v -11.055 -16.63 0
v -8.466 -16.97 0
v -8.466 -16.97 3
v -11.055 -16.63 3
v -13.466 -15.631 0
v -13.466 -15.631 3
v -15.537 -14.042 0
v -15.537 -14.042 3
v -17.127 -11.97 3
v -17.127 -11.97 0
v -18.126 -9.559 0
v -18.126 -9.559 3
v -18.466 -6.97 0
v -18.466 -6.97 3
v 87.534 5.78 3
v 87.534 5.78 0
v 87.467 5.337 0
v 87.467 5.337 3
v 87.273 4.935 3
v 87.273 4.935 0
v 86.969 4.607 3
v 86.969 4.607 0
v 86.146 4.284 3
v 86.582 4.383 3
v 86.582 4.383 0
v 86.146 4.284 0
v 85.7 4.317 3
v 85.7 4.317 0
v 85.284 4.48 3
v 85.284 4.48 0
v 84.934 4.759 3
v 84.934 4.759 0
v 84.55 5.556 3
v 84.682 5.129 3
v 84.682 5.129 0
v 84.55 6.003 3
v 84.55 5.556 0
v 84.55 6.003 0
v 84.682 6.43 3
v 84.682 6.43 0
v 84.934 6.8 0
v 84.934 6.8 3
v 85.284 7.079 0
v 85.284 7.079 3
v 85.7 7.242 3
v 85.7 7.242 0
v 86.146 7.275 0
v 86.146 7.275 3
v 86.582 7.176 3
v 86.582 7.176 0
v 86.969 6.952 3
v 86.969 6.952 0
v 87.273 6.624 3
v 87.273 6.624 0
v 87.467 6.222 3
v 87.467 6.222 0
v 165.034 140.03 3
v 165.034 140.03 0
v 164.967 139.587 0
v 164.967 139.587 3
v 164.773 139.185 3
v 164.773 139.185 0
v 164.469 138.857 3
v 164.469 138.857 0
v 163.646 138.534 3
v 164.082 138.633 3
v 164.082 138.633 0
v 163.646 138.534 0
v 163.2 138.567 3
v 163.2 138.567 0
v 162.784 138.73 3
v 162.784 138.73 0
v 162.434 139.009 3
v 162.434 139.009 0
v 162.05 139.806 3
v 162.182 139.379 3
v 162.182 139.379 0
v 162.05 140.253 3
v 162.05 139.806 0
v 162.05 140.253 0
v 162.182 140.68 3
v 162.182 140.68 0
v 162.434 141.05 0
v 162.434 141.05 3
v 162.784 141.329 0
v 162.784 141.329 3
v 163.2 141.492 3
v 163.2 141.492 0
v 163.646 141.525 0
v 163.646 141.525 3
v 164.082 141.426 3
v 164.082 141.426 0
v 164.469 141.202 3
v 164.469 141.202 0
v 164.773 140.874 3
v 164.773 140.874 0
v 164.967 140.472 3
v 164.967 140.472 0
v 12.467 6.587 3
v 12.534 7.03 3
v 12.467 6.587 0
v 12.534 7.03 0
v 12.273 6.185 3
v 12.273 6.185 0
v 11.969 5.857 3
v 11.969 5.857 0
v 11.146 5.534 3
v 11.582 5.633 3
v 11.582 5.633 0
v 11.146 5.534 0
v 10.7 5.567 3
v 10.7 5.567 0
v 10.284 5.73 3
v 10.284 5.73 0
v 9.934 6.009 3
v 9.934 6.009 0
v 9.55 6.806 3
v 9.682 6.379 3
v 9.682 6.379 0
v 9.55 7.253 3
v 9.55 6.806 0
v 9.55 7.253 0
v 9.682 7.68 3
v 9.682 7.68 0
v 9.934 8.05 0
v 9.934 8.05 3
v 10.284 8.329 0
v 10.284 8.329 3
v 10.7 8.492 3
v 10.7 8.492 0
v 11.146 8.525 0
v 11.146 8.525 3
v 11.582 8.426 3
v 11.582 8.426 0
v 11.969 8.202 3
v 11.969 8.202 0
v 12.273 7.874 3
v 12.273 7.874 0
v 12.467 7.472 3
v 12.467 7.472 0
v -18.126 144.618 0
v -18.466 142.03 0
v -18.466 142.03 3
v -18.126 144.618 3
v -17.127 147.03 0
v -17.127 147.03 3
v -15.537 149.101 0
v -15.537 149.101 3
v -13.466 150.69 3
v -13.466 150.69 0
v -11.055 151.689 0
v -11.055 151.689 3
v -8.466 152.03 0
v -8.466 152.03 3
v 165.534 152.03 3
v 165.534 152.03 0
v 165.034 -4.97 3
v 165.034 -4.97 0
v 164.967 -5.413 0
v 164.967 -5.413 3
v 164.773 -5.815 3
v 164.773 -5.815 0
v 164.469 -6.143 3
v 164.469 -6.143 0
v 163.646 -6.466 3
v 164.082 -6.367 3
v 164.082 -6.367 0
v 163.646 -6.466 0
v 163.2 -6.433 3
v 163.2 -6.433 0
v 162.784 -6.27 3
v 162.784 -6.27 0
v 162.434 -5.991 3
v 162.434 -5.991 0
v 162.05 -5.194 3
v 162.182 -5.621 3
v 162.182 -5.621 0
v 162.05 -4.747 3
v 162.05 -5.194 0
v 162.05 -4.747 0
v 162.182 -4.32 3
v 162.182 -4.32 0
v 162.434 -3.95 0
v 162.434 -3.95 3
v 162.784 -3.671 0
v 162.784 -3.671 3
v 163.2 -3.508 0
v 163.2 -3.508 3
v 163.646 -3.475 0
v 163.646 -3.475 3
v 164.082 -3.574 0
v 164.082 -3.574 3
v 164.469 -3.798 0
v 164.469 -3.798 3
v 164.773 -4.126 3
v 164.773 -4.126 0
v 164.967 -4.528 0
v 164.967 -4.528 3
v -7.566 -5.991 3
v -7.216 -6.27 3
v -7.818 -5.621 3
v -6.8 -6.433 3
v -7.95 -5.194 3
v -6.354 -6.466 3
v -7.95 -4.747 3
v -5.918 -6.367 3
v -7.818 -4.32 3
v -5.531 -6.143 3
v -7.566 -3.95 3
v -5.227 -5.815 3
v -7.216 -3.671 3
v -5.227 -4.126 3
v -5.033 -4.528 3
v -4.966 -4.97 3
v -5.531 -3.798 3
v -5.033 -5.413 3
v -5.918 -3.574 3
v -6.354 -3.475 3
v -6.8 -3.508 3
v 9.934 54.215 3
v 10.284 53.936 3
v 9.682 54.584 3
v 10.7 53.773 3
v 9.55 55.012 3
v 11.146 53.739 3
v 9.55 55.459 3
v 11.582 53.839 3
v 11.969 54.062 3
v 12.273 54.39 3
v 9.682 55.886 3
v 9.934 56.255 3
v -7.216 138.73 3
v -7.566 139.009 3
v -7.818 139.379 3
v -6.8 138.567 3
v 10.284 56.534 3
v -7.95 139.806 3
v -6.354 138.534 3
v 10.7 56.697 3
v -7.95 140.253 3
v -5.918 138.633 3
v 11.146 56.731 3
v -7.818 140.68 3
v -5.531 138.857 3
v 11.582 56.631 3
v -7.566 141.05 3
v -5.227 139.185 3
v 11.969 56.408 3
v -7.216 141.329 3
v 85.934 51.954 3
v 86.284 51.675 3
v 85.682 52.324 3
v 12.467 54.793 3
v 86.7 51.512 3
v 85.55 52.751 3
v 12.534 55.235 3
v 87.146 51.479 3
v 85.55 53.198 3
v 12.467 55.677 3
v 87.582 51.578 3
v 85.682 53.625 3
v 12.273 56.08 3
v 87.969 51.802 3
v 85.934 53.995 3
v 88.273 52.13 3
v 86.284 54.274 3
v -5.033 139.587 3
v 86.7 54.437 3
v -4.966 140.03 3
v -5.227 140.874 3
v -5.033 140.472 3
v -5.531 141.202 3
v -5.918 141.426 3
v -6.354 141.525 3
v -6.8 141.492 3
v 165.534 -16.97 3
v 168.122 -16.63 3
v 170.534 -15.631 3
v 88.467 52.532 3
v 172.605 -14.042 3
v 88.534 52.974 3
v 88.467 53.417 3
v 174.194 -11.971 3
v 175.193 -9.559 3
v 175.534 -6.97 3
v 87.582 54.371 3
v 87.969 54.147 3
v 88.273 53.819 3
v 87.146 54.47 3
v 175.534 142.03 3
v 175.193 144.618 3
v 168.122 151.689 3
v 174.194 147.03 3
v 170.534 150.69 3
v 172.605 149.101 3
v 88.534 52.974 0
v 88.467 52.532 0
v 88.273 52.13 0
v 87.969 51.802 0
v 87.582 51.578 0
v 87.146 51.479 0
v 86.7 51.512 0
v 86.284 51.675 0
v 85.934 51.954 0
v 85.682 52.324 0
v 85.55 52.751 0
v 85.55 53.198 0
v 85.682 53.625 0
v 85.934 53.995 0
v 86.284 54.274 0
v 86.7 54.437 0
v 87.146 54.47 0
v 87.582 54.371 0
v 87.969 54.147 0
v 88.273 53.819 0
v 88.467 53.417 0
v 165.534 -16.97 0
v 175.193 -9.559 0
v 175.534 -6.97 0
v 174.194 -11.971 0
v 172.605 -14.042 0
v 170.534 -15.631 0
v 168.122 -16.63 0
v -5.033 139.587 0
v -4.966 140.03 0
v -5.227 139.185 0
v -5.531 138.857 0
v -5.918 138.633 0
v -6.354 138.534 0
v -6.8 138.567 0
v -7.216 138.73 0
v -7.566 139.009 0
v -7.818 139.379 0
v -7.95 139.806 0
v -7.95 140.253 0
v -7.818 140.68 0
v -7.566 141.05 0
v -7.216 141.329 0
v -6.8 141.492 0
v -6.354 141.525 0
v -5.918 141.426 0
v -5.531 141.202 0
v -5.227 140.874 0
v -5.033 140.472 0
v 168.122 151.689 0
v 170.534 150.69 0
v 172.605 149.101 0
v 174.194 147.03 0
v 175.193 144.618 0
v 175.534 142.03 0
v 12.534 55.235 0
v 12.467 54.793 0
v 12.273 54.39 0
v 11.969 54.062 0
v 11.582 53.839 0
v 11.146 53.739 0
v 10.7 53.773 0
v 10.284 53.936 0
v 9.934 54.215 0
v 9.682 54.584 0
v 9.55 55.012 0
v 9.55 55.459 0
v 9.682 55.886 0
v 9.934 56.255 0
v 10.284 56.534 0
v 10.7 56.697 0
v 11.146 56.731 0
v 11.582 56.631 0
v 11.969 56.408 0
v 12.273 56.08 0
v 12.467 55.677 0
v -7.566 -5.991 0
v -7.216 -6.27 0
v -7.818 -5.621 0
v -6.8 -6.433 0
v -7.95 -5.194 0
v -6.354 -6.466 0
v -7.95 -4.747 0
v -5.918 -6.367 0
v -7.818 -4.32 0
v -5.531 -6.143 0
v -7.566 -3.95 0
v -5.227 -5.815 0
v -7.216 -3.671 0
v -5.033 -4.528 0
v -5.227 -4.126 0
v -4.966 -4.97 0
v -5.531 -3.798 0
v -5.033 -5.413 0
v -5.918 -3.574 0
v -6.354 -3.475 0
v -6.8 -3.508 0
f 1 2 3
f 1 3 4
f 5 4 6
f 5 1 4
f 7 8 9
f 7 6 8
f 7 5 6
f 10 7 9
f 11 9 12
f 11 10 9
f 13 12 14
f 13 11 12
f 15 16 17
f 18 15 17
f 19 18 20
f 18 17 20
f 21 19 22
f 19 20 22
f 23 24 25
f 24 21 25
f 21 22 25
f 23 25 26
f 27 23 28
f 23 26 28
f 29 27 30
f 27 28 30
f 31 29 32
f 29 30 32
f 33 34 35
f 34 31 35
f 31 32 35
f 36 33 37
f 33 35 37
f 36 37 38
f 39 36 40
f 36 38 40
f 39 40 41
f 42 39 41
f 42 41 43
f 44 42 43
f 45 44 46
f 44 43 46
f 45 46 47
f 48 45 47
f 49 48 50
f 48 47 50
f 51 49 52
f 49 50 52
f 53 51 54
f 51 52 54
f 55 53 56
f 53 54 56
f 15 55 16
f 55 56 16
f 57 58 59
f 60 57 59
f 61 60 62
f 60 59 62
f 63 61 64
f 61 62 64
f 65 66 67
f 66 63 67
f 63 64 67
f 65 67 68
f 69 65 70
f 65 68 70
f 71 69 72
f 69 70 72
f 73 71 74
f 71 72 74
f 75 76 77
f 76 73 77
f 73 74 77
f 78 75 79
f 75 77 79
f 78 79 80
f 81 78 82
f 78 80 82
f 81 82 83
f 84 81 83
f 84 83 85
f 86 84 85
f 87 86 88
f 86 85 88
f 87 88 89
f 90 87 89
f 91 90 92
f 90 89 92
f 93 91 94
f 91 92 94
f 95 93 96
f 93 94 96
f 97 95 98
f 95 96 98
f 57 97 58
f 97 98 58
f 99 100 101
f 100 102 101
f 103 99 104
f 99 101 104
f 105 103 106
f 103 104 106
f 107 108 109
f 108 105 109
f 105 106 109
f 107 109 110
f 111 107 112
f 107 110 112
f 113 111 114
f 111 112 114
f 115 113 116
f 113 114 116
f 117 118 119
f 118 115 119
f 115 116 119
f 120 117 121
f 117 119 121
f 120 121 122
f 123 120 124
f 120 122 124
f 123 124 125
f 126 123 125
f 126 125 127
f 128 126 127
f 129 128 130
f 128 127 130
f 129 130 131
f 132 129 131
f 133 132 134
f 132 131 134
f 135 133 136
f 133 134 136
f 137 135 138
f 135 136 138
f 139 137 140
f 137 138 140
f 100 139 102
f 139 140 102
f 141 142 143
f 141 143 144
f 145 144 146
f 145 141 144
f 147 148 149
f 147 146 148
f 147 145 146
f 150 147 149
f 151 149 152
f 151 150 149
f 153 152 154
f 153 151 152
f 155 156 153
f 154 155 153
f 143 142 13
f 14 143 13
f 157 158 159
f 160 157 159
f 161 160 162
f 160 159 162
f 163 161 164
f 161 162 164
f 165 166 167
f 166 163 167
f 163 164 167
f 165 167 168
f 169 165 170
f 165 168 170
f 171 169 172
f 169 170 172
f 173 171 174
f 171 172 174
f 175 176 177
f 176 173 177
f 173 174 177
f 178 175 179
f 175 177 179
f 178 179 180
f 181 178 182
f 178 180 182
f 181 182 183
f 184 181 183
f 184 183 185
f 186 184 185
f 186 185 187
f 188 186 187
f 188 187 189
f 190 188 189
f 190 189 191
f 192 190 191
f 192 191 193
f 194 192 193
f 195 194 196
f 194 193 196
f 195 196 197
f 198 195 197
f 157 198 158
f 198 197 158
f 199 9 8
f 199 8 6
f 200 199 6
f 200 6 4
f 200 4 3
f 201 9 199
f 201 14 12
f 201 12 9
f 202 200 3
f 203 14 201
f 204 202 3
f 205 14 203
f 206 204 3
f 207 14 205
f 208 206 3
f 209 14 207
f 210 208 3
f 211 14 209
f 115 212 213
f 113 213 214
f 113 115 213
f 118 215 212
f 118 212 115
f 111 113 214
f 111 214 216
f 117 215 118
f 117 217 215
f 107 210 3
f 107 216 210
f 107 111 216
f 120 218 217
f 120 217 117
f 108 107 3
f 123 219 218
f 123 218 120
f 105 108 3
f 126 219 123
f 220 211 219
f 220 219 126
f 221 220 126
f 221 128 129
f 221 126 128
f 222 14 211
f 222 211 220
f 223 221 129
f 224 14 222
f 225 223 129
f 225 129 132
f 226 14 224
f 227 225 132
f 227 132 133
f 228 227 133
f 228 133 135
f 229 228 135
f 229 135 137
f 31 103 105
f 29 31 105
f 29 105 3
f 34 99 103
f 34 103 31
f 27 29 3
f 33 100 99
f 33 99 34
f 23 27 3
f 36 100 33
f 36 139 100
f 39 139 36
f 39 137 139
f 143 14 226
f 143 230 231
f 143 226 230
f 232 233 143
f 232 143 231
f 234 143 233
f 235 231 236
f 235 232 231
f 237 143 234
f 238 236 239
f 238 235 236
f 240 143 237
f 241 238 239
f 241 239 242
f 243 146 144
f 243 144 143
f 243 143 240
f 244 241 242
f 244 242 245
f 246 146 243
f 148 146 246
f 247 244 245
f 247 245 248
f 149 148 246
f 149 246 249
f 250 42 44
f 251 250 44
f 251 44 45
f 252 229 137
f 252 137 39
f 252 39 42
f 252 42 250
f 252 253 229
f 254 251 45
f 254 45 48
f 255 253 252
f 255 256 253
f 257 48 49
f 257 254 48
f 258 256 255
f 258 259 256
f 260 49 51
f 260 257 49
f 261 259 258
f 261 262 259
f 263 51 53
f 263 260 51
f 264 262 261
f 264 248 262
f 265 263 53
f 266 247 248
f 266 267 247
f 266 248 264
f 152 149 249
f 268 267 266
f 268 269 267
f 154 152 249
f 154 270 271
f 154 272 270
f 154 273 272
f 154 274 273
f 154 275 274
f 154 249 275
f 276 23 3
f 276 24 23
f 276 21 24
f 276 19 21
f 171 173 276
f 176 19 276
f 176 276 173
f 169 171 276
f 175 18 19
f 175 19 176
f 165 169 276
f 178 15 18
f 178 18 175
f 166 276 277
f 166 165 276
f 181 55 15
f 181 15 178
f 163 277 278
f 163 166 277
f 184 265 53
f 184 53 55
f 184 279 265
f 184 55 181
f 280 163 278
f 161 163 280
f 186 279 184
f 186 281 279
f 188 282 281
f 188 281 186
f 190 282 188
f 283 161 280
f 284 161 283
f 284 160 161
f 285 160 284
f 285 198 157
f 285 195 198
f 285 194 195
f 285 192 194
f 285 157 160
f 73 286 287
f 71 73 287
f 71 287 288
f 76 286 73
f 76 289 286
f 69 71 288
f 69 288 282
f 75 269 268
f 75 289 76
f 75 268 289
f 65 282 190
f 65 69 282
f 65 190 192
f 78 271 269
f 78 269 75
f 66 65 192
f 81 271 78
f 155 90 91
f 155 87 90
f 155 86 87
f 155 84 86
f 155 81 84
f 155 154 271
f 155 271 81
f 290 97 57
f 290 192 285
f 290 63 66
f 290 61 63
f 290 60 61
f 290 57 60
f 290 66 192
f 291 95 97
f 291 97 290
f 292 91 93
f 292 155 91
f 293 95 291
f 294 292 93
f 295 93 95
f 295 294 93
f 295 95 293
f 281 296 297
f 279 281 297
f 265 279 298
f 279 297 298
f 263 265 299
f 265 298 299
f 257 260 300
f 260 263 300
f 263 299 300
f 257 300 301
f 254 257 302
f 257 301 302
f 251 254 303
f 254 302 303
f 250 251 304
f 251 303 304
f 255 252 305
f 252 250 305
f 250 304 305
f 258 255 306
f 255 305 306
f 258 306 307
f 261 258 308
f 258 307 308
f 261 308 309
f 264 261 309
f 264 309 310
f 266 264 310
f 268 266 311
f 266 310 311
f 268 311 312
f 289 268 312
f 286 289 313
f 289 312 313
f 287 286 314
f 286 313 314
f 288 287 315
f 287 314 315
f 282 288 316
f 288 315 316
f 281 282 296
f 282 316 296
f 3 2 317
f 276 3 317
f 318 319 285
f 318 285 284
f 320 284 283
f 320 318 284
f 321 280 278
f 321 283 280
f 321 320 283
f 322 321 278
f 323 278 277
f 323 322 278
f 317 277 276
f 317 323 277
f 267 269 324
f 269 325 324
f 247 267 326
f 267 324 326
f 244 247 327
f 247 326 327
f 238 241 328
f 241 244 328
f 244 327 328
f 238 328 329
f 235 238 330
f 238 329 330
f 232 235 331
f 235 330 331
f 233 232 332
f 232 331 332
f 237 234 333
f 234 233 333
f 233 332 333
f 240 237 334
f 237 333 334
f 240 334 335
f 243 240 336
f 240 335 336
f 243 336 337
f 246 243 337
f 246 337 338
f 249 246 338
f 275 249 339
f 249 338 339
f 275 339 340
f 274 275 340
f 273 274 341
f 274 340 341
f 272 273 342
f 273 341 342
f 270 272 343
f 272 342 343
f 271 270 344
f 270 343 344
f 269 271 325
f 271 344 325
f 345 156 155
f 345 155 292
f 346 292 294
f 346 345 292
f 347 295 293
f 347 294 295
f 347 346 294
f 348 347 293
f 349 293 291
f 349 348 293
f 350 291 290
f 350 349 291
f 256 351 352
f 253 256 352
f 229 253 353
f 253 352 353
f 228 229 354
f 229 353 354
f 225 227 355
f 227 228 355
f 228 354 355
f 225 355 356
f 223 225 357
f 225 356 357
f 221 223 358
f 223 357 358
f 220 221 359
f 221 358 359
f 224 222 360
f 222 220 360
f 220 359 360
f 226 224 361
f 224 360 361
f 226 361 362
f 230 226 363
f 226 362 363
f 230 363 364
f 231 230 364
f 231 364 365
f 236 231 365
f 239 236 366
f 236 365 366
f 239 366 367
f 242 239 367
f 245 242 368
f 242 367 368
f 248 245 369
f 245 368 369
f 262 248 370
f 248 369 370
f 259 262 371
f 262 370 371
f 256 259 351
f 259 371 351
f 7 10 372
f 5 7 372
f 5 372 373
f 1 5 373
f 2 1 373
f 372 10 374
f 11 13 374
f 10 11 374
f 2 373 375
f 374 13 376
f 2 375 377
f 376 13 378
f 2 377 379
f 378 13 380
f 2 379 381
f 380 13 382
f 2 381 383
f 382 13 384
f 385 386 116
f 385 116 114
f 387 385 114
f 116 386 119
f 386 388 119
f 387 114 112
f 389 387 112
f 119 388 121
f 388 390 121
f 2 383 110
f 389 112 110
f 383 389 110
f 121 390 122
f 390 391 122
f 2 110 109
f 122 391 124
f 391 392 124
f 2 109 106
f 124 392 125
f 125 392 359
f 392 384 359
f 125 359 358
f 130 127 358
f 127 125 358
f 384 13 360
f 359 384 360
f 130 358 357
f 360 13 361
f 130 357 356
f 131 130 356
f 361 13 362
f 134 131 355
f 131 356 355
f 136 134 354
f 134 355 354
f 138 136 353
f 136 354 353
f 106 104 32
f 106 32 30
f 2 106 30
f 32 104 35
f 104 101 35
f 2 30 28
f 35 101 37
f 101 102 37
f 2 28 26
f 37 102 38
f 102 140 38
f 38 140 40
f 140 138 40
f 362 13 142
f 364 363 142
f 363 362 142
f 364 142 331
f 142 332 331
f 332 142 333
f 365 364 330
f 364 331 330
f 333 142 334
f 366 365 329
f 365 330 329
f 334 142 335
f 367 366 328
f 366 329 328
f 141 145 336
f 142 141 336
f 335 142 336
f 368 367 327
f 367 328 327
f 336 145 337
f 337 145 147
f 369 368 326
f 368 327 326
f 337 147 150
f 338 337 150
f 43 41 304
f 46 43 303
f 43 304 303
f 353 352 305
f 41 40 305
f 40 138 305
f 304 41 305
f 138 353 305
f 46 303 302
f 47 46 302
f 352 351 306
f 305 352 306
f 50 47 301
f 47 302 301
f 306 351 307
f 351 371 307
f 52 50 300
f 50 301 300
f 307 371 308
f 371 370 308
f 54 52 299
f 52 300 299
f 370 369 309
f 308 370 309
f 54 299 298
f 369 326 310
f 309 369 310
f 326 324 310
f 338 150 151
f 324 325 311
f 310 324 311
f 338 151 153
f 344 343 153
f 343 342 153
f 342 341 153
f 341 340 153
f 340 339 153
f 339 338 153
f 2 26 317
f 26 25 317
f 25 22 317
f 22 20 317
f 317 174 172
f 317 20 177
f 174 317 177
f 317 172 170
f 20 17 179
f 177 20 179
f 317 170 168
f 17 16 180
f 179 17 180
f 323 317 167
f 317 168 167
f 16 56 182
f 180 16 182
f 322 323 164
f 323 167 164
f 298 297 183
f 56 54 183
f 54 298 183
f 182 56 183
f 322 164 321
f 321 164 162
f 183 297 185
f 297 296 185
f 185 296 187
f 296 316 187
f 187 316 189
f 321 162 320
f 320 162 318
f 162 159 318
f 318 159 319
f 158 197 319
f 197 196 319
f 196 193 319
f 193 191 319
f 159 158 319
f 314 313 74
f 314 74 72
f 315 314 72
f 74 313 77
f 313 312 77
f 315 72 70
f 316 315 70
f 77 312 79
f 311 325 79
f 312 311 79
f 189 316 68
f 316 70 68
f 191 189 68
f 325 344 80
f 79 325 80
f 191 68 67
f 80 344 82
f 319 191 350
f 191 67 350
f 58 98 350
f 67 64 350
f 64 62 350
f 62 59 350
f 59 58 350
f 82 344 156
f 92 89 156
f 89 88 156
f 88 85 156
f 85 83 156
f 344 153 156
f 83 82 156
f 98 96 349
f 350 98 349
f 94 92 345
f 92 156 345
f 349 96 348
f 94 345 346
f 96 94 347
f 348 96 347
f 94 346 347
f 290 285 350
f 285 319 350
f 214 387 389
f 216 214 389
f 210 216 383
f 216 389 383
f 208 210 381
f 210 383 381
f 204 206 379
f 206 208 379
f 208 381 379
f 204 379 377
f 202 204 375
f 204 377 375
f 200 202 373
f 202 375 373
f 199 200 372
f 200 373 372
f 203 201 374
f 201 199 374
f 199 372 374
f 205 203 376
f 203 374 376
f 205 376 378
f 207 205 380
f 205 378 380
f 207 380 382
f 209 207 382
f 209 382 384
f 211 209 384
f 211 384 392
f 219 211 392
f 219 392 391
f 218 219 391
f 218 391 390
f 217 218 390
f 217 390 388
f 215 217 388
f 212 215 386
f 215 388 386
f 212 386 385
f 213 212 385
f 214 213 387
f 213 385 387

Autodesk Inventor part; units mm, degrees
ref_plane "YZ Plane" through (0, 0, 0) normal (1, 0, 0) x (0, 1, 0)
ref_plane "XZ Plane" through (0, 0, 0) normal (0, 1, 0) x (-1, 0, 0)
ref_plane "XY Plane" through (0, 0, 0) normal (0, 0, 1) x (1, 0, 0)
sketch "Sketch1" plane through (0, 0, 0) normal (0, 0, 1) x (1, 0, 0)
  line L0 (-6.4664, 150.0295) -> (163.5336, 150.0295) construction
  line L1 (173.5336, 140.0295) -> (173.5336, -4.9705) construction
  line L2 (163.5336, -14.9705) -> (-6.4664, -14.9705)
  line L3 (-16.4664, -4.9705) -> (-16.4664, 140.0295)
  arc A0 (-6.4664, 150.0295) -> (-16.4664, 140.0295) centre (-6.4664, 140.0295) ccw
  arc A1 (173.5336, 140.0295) -> (163.5336, 150.0295) centre (163.5336, 140.0295) ccw construction
  arc A2 (163.5336, -14.9705) -> (173.5336, -4.9705) centre (163.5336, -4.9705) ccw
  arc A3 (-16.4664, -4.9705) -> (-6.4664, -14.9705) centre (-6.4664, -4.9705) ccw
  line L4 (-16.4664, 140.0295) -> (173.5336, 140.0295) construction
  line L5 (-16.4664, -4.9705) -> (173.5336, -4.9705) construction
  line L6 (-6.4664, -14.9705) -> (-6.4664, 150.0295) construction
  line L7 (163.5336, 150.0295) -> (163.5336, -14.9705) construction
  circle A4 centre (-6.4664, 140.0295) radius 1.5
  circle A5 centre (163.5336, 140.0295) radius 1.5
  circle A6 centre (163.5336, -4.9705) radius 1.5
  circle A7 centre (-6.4664, -4.9705) radius 1.5
  circle A8 centre (11.0336, 7.0295) radius 1.5
  circle A9 centre (86.0336, 5.7795) radius 1.5
  circle A10 centre (11.0336, 55.2351) radius 1.5
  circle A11 centre (87.0336, 52.9745) radius 1.5
  line L8 (-8.4664, -16.9705) -> (165.5336, -16.9705)
  line L9 (175.5336, -6.9705) -> (175.5336, 142.0295)
  line L10 (165.5336, 152.0295) -> (-8.4664, 152.0295)
  line L11 (-18.4664, 142.0295) -> (-18.4664, -6.9705)
  arc A12 (-8.4664, 152.0295) -> (-18.4664, 142.0295) centre (-8.4664, 142.0295) ccw
  arc A13 (-18.4664, -6.9705) -> (-8.4664, -16.9705) centre (-8.4664, -6.9705) ccw
  arc A14 (165.5336, -16.9705) -> (175.5336, -6.9705) centre (165.5336, -6.9705) ccw
  arc A15 (175.5336, 142.0295) -> (165.5336, 152.0295) centre (165.5336, 142.0295) ccw
  point P0 (0, 0)
  point P1 (173.5336, -14.9705)
  point P2 (173.5336, 150.0295)
  point P3 (-16.4664, -14.9705)
  point P4 (-18.4664, -16.9705)
  point P5 (175.5336, 152.0295)
  point P6 (-18.4664, 152.0295)
  dimension "d0" = 190
  dimension "d1" = 165
  dimension "d2" = 10
  dimension "a" = 3
  dimension "d4" = 3
  dimension "d5" = 3
  dimension "d6" = 3
  dimension "d7" = 3
  dimension "d8" = 3
  dimension "d9" = 3
  dimension "d10" = 3
  dimension "d11" = 12
  dimension "d12" = 10.75
  dimension "d14" = 75
  dimension "d16" = 76
  dimension "d17" = 194
  dimension "d18" = 169
  dimension "d19" = 2
  dimension "d20" = 2
  dimension "d21" = 10
  dimension "d24" = 29.5
  dimension "d25" = 29.5
extrude "Extrusion1" add sketch "Sketch1" along normal blind 3
equation "\"d4\" = a"
equation "\"d5\" = a"
equation "\"d6\" = a"
equation "\"d7\" = a"
equation "\"d8\" = a"
equation "\"d9\" = a"
equation "\"d10\" = a"
properties part number "Back"
